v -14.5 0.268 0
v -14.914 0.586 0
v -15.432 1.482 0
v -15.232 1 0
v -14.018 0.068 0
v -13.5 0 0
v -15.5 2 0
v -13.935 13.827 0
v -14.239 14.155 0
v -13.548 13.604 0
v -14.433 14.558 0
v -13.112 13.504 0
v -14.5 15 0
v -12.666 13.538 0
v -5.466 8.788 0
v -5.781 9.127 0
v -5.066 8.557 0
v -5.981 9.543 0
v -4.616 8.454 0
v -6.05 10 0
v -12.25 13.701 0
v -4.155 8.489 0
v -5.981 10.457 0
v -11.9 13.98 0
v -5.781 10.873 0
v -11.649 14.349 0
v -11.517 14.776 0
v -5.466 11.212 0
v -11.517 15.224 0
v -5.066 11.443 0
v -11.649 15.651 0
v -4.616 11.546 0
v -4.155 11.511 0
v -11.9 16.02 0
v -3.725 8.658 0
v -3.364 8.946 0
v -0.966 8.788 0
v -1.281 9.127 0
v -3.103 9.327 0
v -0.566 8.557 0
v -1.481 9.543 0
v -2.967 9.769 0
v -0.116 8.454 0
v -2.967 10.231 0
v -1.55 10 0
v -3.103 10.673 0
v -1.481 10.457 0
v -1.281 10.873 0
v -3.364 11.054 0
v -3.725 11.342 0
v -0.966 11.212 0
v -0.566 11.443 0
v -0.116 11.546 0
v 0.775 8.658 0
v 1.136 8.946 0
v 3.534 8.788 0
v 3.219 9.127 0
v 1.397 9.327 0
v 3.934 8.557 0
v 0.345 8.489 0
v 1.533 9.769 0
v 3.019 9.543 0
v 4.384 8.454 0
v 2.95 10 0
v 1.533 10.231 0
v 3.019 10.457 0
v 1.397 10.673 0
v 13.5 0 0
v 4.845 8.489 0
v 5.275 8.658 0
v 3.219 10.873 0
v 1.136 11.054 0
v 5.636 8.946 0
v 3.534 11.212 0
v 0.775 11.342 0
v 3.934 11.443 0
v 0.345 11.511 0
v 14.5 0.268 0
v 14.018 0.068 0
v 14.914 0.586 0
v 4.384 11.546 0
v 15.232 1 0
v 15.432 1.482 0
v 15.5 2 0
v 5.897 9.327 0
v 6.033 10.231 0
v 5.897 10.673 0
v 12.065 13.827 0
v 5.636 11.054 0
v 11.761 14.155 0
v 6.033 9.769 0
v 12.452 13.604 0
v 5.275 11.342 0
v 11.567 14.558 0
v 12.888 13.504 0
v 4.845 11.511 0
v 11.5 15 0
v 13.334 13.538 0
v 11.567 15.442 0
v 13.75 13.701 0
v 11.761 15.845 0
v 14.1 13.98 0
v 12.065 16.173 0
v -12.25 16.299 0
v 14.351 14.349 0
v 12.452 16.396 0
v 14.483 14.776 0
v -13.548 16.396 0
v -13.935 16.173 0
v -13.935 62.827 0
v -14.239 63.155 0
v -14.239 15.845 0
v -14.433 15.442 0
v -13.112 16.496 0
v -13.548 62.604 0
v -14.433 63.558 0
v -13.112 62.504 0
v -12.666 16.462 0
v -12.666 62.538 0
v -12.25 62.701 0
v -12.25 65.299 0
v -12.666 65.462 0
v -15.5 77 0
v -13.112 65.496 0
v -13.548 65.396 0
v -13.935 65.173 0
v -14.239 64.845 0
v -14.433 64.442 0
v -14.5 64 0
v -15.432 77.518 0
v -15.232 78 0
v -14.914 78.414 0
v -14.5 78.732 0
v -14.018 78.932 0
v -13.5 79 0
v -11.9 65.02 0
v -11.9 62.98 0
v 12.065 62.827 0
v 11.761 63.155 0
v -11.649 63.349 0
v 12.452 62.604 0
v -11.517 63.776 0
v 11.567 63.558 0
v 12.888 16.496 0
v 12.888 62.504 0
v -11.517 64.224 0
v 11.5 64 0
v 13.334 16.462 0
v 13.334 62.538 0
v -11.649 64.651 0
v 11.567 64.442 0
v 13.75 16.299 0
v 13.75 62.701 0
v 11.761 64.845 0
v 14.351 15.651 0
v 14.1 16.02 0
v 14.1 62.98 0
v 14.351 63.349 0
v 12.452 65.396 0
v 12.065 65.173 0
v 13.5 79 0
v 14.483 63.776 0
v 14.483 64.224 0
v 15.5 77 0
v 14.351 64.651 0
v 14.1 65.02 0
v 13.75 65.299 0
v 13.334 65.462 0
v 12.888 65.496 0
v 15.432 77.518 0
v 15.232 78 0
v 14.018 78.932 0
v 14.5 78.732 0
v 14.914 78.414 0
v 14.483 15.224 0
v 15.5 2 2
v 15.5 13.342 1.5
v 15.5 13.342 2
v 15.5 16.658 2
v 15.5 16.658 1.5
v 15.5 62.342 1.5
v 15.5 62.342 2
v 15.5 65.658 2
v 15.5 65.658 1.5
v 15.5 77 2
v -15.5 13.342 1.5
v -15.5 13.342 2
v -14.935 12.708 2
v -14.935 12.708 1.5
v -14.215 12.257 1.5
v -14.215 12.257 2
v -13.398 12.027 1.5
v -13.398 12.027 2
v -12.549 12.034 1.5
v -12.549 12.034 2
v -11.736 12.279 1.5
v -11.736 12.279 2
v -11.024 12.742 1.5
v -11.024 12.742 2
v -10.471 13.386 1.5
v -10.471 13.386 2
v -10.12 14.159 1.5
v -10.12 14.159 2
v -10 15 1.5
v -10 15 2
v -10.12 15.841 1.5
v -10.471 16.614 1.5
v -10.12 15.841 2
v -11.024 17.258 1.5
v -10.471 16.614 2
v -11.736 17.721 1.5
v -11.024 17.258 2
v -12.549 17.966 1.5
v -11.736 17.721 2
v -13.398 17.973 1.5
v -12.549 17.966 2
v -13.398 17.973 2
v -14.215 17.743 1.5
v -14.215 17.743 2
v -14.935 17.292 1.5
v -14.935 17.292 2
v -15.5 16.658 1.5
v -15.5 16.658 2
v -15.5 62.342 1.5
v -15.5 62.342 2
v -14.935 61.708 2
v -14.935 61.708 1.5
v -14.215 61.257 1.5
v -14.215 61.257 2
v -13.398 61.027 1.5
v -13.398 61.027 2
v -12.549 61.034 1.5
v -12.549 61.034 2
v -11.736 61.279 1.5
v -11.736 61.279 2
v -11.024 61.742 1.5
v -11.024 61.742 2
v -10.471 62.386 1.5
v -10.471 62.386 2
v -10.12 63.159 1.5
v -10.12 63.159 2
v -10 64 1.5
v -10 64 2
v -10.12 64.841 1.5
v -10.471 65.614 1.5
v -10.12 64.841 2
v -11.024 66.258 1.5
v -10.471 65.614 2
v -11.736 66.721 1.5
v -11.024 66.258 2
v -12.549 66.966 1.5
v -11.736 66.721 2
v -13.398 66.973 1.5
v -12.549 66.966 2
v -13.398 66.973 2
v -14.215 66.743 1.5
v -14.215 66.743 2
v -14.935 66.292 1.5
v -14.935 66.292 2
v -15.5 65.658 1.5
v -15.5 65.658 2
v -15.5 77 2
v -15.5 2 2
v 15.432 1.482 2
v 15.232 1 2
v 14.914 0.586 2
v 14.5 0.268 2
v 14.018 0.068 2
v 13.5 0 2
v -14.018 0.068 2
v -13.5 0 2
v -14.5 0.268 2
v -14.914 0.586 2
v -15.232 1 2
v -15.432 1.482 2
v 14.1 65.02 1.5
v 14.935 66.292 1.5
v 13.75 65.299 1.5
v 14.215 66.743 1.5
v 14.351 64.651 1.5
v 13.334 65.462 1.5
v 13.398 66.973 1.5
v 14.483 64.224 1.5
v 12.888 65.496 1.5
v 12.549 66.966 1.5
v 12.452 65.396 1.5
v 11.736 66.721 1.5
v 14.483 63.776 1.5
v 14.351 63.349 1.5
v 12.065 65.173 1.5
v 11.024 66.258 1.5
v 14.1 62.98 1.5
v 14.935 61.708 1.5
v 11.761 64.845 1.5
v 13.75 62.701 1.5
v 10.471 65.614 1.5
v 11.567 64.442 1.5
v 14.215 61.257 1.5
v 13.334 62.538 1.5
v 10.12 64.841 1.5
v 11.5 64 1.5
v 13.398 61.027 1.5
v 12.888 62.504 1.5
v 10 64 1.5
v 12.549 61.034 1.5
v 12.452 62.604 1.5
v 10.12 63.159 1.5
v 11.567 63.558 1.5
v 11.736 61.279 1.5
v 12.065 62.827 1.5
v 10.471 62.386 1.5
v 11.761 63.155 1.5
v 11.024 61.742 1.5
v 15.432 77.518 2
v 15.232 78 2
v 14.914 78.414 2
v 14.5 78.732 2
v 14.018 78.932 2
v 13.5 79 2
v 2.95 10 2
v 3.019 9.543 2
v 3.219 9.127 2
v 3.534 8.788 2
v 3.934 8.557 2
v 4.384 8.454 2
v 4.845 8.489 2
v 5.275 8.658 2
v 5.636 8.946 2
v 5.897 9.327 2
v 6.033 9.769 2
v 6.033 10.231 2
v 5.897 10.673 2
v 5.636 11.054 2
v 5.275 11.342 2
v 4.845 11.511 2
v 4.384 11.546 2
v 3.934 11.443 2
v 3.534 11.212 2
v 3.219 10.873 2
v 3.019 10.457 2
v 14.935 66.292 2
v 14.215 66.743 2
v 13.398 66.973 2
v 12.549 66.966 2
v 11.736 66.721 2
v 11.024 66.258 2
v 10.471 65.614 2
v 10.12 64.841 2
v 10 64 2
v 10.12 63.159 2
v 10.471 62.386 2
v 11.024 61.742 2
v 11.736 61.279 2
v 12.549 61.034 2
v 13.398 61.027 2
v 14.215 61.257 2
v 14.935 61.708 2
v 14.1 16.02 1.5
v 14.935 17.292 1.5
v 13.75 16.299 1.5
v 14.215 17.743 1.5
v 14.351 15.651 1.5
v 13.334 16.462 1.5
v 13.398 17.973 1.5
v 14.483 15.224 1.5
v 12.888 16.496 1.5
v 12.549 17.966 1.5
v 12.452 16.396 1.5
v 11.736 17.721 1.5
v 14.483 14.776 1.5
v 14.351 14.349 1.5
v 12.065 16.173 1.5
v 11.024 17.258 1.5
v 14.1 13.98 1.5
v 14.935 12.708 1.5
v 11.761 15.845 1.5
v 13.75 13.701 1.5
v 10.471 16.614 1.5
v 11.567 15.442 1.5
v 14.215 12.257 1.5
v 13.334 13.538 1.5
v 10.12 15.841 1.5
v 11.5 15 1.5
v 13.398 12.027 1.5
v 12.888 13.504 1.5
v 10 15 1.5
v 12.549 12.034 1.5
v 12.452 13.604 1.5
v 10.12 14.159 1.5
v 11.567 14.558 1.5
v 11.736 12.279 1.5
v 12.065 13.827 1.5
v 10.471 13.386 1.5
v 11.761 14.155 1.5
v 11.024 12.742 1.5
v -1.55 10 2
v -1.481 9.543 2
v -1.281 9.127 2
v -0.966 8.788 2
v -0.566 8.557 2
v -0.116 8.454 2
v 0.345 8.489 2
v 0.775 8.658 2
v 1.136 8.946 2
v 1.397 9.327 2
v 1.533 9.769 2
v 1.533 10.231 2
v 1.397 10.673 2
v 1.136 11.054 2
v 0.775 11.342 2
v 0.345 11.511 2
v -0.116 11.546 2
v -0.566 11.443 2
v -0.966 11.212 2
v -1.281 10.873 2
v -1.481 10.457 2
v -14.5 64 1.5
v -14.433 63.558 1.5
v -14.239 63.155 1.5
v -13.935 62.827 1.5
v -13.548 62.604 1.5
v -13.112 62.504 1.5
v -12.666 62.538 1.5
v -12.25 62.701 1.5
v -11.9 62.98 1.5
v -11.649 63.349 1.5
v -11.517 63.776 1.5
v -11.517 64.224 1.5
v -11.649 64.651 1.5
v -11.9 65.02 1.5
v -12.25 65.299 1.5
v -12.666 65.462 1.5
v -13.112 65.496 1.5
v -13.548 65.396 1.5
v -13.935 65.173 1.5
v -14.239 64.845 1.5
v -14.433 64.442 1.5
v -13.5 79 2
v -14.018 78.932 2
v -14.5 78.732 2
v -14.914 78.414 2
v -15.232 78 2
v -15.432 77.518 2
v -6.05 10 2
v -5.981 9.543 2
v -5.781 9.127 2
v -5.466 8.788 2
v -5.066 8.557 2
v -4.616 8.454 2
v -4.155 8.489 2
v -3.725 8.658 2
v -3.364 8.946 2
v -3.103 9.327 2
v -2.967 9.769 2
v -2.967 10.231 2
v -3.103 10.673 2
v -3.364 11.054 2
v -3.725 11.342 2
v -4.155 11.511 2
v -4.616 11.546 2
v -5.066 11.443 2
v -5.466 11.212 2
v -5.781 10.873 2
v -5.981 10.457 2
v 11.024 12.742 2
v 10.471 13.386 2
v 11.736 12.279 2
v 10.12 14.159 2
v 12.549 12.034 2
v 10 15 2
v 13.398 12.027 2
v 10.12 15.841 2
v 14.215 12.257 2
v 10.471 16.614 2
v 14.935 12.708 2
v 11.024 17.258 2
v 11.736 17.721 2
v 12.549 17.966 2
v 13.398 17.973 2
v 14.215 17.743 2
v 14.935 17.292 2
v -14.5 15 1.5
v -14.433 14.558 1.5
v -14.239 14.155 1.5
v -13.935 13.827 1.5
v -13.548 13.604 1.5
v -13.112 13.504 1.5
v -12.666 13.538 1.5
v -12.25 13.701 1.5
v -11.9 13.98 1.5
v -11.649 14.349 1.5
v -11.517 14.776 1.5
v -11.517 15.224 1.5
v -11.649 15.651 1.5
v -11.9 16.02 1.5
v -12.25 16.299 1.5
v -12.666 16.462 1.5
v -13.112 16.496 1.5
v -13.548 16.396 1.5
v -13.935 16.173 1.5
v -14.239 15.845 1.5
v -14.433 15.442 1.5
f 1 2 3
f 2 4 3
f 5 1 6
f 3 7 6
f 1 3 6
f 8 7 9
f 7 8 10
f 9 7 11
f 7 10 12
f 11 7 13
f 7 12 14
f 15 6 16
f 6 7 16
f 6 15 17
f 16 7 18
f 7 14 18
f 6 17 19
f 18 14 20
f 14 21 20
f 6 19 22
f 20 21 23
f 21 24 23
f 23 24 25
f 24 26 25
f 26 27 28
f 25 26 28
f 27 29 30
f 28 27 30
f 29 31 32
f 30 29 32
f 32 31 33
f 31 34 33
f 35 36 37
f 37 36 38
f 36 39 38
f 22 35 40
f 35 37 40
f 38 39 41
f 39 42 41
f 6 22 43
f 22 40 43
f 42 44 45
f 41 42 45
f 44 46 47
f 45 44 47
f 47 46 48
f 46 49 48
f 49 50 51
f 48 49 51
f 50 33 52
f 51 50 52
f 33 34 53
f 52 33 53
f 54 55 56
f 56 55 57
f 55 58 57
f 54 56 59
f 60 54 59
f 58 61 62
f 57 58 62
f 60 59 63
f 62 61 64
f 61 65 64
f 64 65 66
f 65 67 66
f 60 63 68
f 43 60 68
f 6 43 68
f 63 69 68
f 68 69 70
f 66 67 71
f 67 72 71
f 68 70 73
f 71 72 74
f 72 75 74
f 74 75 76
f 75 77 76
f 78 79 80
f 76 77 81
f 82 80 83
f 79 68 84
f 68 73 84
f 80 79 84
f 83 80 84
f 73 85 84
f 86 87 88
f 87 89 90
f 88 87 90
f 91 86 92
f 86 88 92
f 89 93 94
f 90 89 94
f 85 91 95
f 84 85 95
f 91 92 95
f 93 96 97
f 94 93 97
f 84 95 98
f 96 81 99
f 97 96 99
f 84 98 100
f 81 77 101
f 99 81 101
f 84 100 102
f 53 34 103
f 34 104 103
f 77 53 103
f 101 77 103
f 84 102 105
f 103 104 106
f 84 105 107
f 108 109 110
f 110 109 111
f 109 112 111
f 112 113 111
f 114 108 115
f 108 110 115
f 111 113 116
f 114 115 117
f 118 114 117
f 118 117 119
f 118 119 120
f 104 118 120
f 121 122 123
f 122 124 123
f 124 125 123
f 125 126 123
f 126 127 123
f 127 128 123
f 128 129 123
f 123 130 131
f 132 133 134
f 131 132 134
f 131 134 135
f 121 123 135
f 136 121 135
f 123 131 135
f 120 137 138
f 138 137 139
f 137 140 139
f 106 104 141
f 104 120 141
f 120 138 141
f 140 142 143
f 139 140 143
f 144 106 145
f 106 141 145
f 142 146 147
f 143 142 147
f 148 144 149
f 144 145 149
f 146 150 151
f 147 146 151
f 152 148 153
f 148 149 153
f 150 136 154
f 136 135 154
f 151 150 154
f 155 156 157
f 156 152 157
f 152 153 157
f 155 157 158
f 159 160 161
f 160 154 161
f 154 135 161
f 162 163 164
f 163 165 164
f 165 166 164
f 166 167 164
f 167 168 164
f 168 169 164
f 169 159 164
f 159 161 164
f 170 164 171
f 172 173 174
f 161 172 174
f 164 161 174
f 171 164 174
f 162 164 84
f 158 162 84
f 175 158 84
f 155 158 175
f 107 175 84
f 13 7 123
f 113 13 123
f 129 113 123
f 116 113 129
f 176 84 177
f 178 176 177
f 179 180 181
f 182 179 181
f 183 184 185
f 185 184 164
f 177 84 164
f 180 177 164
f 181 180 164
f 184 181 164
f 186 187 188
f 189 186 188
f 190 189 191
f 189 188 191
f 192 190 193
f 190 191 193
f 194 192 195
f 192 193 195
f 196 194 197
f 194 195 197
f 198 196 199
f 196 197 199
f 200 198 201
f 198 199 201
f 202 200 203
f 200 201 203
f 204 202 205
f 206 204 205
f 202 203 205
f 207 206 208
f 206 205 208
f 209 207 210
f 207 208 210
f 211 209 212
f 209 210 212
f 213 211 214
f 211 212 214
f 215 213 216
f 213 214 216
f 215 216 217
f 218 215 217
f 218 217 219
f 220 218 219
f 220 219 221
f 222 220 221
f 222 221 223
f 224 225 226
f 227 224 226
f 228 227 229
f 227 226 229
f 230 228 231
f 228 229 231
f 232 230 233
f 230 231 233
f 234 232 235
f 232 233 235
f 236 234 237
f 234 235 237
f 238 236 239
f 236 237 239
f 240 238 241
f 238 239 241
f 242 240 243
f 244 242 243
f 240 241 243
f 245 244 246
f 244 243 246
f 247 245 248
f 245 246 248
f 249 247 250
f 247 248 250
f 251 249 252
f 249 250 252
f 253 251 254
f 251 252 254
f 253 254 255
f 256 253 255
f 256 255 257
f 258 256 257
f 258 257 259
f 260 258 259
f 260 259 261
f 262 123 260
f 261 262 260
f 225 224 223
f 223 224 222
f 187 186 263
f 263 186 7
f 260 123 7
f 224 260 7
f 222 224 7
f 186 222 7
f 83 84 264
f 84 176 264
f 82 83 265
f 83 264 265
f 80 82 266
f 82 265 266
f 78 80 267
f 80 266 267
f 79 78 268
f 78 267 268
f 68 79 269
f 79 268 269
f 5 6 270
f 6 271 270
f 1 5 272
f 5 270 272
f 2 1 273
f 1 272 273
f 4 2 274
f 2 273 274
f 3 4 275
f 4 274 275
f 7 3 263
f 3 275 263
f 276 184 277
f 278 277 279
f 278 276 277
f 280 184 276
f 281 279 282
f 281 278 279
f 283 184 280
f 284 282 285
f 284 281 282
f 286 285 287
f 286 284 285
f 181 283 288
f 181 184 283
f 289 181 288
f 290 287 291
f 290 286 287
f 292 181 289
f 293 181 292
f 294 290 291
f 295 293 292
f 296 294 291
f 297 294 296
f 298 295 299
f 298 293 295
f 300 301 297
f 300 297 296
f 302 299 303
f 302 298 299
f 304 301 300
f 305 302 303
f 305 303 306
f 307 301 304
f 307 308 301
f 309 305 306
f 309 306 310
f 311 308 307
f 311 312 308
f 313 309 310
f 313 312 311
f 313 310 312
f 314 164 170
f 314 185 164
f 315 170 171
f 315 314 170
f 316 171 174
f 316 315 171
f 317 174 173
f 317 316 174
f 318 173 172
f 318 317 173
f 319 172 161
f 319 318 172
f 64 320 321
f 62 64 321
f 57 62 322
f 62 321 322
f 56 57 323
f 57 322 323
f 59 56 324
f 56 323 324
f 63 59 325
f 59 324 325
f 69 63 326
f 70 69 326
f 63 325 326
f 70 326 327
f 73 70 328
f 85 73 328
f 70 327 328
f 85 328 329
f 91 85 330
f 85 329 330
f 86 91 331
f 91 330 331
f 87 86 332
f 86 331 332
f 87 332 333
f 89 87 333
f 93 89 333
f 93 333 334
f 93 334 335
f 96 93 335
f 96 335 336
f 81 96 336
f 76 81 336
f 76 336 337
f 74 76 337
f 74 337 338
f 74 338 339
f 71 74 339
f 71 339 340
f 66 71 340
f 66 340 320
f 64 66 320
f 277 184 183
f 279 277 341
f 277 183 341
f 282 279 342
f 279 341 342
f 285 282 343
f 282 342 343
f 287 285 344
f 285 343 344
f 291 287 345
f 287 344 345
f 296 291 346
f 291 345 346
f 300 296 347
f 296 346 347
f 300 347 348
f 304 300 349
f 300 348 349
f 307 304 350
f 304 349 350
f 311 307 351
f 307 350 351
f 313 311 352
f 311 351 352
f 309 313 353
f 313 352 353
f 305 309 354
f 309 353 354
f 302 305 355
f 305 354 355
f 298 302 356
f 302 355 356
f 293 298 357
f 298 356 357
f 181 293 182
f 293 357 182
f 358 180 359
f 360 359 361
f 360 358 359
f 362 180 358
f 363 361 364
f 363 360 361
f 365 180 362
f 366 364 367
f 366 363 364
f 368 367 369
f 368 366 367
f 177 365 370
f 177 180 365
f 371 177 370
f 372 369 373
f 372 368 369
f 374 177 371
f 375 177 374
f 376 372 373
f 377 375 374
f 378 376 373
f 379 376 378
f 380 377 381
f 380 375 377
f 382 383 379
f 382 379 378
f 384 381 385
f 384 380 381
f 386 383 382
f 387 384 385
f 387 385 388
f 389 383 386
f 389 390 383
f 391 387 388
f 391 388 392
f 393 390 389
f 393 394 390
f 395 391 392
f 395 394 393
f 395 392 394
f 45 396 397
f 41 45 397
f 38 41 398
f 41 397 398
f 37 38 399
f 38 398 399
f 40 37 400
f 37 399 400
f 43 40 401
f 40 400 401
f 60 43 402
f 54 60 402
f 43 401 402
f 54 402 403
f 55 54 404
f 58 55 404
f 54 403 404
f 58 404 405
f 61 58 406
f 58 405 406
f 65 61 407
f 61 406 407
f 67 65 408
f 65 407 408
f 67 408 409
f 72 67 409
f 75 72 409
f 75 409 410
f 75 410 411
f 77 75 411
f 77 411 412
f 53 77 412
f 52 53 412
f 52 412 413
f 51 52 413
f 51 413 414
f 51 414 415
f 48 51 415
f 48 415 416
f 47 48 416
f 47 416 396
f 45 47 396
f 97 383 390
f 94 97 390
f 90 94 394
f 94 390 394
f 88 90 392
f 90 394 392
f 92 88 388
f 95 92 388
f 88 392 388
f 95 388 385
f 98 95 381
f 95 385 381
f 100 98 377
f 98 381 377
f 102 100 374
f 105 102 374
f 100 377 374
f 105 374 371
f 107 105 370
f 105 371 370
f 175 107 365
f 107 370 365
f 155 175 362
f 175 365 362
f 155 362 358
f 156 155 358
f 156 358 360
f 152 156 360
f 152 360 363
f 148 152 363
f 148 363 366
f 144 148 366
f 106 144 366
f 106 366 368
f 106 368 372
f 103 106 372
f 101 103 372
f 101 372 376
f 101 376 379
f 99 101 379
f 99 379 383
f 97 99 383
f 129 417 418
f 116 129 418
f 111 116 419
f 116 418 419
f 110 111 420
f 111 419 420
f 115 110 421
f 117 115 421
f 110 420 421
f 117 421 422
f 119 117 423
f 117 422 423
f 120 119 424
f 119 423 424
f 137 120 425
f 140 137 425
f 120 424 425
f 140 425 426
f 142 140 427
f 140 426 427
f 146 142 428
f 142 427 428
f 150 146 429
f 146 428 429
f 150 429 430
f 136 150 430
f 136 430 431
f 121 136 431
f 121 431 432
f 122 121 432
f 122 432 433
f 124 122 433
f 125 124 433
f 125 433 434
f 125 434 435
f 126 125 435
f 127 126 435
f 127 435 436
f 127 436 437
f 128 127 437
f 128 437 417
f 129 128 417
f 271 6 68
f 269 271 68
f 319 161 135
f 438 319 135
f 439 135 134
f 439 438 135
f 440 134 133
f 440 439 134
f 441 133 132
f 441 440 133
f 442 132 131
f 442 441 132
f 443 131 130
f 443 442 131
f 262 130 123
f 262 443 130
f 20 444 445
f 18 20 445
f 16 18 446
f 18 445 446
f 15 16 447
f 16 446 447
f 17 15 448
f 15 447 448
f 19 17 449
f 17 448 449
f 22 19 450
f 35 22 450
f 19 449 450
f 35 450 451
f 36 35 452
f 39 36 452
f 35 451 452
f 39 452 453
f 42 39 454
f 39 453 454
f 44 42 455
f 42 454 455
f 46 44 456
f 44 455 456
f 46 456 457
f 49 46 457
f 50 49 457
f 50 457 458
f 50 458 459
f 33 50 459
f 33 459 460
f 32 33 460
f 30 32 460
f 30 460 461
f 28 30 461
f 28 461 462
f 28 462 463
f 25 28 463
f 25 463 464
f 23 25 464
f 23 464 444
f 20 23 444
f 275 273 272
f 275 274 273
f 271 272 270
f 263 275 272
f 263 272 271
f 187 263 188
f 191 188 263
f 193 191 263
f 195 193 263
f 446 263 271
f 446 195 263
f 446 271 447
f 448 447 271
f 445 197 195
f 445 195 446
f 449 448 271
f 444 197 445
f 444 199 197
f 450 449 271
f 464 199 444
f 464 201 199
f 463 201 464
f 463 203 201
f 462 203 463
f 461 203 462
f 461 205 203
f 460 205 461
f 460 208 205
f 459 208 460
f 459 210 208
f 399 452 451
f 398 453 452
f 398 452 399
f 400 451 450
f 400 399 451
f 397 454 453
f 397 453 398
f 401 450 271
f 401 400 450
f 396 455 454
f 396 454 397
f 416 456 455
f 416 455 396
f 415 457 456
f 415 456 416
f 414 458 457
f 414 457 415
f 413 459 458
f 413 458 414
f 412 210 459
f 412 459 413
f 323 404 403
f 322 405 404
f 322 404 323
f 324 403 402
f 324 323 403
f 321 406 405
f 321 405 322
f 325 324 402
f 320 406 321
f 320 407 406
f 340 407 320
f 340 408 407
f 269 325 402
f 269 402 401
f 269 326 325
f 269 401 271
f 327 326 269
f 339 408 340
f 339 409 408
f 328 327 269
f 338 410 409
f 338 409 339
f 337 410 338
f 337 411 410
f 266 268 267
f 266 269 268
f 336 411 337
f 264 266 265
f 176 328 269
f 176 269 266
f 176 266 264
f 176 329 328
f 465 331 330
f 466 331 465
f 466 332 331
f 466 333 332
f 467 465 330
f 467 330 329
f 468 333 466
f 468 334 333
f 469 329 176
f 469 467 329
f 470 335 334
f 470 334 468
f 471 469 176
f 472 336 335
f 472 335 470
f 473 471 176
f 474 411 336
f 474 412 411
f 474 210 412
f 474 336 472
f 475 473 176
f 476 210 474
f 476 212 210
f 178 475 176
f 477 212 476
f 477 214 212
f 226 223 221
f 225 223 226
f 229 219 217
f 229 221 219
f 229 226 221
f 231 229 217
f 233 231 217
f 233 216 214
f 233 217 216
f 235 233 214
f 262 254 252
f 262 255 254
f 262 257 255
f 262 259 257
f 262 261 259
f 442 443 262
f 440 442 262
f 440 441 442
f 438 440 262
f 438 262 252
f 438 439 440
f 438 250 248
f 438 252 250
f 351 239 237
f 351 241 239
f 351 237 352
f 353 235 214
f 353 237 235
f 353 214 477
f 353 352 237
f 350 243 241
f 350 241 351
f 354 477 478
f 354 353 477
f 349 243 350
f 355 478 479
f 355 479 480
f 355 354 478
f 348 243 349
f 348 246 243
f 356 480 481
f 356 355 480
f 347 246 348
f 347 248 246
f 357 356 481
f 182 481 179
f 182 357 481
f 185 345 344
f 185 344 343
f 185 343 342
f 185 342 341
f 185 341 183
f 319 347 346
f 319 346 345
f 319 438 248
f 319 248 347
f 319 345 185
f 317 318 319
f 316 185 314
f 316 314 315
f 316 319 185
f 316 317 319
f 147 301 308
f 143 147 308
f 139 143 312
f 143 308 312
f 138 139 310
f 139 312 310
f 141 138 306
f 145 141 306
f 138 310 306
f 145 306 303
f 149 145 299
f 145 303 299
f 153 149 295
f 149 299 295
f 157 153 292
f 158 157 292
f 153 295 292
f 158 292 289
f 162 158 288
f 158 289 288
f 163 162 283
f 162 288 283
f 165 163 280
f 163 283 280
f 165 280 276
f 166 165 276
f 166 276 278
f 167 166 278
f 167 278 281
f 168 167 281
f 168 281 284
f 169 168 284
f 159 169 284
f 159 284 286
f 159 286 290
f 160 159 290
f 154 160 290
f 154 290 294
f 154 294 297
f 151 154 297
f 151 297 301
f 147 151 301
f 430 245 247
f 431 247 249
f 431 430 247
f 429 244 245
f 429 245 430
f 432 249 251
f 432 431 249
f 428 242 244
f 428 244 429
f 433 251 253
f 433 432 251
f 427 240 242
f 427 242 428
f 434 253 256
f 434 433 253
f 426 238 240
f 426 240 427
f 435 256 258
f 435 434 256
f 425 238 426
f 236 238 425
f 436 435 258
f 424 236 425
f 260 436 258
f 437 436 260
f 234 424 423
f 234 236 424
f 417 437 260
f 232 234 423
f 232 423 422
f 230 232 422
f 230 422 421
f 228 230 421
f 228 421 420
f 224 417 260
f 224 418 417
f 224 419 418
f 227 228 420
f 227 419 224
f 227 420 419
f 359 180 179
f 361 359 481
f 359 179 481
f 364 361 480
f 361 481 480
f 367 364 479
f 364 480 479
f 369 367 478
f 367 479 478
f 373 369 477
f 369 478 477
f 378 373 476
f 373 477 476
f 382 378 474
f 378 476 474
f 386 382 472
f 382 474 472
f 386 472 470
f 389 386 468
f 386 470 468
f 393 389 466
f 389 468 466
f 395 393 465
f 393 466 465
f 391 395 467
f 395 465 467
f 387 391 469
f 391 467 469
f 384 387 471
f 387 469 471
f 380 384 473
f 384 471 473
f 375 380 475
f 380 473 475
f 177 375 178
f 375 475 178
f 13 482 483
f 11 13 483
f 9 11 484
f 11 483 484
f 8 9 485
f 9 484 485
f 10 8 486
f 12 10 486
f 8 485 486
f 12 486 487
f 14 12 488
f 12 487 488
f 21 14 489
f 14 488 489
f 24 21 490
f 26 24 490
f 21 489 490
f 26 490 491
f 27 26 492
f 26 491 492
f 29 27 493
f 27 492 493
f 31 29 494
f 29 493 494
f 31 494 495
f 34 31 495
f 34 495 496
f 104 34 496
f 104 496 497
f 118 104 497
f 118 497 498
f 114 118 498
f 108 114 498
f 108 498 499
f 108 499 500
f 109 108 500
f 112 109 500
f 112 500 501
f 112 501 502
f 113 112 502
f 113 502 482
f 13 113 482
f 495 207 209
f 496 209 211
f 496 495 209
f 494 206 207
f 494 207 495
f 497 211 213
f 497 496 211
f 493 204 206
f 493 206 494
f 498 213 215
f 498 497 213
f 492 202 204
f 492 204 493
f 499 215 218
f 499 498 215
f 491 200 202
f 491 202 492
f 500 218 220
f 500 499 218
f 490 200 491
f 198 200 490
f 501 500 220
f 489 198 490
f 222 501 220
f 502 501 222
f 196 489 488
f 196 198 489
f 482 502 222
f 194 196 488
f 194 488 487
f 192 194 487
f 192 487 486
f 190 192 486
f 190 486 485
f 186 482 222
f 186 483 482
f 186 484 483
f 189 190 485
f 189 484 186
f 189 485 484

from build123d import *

# Parameters (mm, degrees)
PAD_DEPTH       = 2
SKETCH001_R     = 1.5
POCKET_DEPTH    = 2.001
SKETCH002_R     = 3
POCKET001_DEPTH = 0.5
SKETCH003_R     = 1.55
POCKET002_DEPTH = 2.001
FILLET_R        = 2


with BuildPart() as part:
    # Sketch → Pad (new body)
    with BuildSketch(Plane.XY):
        Polygon((0, 0), (15.5, 0), (15.5, 39.5), (15.5, 79), (0, 79), (-15.5, 79), (-15.5, 39.5), (-15.5, 0), align=None)
    extrude(amount=PAD_DEPTH)

    # Sketch001 (on DatumPlane) → Pocket (cut, through all)
    with BuildSketch(Plane(origin=(0, 0, 2), x_dir=(-1, 0, 0), z_dir=(0, 0, 1))):
        with Locations((-13, -15)):
            Circle(SKETCH001_R)
        with Locations((13, -15)):
            Circle(SKETCH001_R)
        with Locations((-13, -64)):
            Circle(SKETCH001_R)
        with Locations((13, -64)):
            Circle(SKETCH001_R)
    extrude(amount=-POCKET_DEPTH, mode=Mode.SUBTRACT)

    # Sketch002 (on DatumPlane) → Pocket001 (cut)
    with BuildSketch(Plane(origin=(0, 0, 2), x_dir=(-1, 0, 0), z_dir=(0, 0, 1))):
        with Locations((-13, -15)):
            Circle(SKETCH002_R)
        with Locations((13, -15)):
            Circle(SKETCH002_R)
        with Locations((-13, -64)):
            Circle(SKETCH002_R)
        with Locations((13, -64)):
            Circle(SKETCH002_R)
    extrude(amount=-POCKET001_DEPTH, mode=Mode.SUBTRACT)

    # Sketch003 (on DatumPlane) → Pocket002 (cut, through all)
    with BuildSketch(Plane(origin=(0, 0, 2), x_dir=(-1, 0, 0), z_dir=(0, 0, 1))):
        with Locations((0, -10)):
            Circle(SKETCH003_R)
        with Locations((-4.5, -10)):
            Circle(SKETCH003_R)
        with Locations((4.5, -10)):
            Circle(SKETCH003_R)
    extrude(amount=-POCKET002_DEPTH, mode=Mode.SUBTRACT)

    # Fillet
    fillet_edges = [part.edges().sort_by_distance(p)[0] for p in [
        (15.5, 79, 1),
        (-15.5, 79, 1),
        (-15.5, 0, 1),
        (15.5, 0, 1),
    ]]
    fillet(fillet_edges, radius=FILLET_R)


solid = part.part
